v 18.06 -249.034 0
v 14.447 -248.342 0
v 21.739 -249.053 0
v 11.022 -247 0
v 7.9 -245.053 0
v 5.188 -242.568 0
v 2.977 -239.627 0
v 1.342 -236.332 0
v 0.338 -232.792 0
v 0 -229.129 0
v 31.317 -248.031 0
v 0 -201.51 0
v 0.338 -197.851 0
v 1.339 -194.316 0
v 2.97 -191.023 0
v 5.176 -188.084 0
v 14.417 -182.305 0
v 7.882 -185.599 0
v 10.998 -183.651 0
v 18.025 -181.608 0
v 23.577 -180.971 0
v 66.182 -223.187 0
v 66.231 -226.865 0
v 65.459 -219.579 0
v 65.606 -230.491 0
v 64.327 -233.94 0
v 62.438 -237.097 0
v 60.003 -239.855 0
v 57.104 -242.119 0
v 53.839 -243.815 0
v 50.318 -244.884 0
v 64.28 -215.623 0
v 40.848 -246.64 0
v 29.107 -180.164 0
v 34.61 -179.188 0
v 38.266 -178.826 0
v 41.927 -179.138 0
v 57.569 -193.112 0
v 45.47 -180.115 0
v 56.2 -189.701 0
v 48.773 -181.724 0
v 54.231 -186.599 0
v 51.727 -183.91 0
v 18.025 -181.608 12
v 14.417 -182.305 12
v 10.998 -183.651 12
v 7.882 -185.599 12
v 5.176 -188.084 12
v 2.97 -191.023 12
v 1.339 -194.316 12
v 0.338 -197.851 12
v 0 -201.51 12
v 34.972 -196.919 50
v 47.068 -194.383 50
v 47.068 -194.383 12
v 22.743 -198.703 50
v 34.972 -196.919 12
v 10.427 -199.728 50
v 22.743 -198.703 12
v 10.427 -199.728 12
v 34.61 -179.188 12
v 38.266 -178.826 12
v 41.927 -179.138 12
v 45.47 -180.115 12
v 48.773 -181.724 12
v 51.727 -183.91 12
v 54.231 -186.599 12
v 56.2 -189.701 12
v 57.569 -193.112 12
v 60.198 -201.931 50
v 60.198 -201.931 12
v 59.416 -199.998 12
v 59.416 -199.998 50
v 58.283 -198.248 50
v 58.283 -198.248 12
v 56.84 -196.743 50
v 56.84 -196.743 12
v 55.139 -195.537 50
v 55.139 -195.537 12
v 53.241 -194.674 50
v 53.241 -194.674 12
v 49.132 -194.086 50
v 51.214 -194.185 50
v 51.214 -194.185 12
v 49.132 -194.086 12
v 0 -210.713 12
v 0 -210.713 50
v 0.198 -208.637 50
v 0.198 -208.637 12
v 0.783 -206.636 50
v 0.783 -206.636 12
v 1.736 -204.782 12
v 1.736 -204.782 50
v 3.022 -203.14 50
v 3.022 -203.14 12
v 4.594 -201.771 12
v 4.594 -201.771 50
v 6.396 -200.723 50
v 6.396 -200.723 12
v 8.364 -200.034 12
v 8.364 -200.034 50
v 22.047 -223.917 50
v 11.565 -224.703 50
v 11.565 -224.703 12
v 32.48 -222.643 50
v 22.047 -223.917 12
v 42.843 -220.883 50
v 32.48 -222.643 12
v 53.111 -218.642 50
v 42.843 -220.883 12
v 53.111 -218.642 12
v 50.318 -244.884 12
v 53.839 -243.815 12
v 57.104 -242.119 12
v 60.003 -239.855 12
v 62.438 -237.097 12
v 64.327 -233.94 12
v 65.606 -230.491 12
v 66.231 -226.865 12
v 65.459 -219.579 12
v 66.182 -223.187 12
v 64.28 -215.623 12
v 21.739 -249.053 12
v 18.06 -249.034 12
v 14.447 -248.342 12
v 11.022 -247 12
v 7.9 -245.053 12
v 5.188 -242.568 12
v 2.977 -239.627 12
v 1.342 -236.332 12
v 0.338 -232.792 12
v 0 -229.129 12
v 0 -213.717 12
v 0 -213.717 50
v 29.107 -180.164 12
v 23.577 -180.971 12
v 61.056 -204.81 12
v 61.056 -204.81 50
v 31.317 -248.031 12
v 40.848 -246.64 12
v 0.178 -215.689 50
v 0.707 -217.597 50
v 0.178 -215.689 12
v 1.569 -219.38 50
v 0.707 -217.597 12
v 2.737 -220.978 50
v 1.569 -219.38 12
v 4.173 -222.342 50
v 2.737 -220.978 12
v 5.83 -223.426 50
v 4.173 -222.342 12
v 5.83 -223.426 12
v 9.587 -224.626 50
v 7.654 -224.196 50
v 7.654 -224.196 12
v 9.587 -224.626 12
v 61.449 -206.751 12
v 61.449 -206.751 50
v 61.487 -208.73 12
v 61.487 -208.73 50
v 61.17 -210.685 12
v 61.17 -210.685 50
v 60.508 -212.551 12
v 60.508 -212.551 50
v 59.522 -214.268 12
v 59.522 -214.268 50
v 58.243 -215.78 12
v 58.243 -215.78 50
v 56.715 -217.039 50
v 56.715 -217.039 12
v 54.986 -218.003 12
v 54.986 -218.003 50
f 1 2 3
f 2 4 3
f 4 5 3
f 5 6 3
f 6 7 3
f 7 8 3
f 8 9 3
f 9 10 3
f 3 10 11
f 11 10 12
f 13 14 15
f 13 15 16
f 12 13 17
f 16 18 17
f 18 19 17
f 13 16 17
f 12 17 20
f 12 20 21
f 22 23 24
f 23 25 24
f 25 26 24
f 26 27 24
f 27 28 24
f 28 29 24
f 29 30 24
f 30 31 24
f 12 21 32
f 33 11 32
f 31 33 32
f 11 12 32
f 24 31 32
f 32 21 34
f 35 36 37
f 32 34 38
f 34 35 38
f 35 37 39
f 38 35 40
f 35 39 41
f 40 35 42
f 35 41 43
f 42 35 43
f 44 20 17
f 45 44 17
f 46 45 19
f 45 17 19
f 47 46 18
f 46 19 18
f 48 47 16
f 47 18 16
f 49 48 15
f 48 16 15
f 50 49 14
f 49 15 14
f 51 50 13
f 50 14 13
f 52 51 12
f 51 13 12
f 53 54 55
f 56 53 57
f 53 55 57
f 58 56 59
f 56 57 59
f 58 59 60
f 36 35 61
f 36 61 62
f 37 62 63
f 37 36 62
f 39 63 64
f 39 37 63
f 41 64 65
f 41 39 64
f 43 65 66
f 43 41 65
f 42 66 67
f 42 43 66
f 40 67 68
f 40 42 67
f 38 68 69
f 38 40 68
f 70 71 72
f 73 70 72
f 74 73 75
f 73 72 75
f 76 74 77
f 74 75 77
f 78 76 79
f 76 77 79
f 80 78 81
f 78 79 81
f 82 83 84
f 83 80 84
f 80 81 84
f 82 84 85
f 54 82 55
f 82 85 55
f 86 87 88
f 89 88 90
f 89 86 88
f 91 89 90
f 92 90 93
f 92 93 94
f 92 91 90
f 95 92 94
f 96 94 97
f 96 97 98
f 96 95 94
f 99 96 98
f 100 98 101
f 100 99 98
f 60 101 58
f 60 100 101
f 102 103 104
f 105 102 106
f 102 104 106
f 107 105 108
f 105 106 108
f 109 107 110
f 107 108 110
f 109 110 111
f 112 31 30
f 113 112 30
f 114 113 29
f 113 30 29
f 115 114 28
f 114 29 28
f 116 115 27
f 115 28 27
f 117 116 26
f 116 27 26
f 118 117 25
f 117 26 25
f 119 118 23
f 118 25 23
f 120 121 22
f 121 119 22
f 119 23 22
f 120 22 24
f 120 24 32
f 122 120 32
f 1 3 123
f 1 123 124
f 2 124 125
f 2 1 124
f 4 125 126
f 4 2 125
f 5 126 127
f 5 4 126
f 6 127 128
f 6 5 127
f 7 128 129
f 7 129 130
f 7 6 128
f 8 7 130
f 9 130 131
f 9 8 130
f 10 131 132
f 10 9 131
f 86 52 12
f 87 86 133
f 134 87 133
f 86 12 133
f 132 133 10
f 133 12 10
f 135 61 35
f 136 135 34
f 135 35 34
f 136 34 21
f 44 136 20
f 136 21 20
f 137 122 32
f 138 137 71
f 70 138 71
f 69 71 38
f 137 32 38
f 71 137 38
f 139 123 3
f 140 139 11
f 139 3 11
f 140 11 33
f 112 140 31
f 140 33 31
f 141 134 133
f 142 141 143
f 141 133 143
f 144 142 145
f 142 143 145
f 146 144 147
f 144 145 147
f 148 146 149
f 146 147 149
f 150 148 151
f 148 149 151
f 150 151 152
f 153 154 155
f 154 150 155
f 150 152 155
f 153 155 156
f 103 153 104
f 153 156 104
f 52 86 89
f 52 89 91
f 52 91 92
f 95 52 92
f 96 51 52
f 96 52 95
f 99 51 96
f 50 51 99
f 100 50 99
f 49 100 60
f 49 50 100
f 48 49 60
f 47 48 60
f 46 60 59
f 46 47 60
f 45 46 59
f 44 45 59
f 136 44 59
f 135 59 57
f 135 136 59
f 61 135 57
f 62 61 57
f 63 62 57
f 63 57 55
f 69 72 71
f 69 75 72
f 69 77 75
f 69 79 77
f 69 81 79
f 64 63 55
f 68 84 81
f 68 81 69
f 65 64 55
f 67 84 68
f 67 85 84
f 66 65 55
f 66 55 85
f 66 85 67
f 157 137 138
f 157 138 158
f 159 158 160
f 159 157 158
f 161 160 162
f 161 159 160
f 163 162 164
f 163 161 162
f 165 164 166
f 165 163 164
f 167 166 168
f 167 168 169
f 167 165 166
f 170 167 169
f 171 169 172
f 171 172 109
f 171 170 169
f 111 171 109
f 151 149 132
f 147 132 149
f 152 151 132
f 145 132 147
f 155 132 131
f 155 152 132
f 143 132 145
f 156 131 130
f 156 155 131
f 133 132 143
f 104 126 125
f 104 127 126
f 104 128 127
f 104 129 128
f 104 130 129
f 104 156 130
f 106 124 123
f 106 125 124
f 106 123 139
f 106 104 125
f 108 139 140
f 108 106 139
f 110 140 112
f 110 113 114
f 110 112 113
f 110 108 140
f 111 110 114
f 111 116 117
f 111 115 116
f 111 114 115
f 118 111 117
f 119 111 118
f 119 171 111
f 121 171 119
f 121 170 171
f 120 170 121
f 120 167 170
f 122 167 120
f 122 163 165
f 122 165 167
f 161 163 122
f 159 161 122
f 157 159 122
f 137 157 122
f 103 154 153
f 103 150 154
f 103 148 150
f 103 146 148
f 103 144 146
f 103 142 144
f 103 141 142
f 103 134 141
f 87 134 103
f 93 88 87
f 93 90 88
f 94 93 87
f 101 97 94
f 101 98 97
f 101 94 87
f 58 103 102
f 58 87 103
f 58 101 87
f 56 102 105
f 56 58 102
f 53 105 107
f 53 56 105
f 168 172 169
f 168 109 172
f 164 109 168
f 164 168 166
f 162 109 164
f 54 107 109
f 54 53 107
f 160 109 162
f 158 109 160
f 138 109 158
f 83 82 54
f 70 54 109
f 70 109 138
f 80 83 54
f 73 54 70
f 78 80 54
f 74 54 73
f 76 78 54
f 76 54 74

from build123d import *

# Parameters (mm, degrees)
F1_DEPTH    = 12
F2_DEPTH    = 50
F3_T1_DEPTH = 120.7987304743
F3_T3_DEPTH = 107.0496265693
F4_T1_DEPTH = 64.7830881456
F4_T3_DEPTH = 66.9231117077


# Not quite as in the source:
# - a fillet or chamfer that OpenCascade refuses, or shapes differently, is made with other operations: its cross-section is extruded or revolved along the edge and cut away or added


with BuildPart() as f1:
    # F0 (on Top) → F1 (new body)
    with BuildSketch(Plane.XY):
        with BuildLine():
            ThreePointArc((64.2798563582, -215.6225870974), (32.480131643, -222.643304522), (0, -225))
            Line((0, -225), (0, -250))
            ThreePointArc((0, -250), (36.0890351588, -247.3814494688), (71.4220626202, -239.5806523304))
            Line((71.4220626202, -239.5806523304), (64.2798563582, -215.6225870974))
        make_face()
        with BuildLine():
            ThreePointArc((57.1376500962, -191.6645218643), (28.8712281271, -197.9051595751), (0, -200))
            Line((0, -200), (0, -225))
            ThreePointArc((0, -225), (32.480131643, -222.643304522), (64.2798563582, -215.6225870974))
            Line((64.2798563582, -215.6225870974), (57.1376500962, -191.6645218643))
        make_face()
        with BuildLine():
            ThreePointArc((52.1381057128, -174.8938762012), (26.344995666, -180.5884581123), (0, -182.5))
            Line((0, -182.5), (0, -200))
            ThreePointArc((0, -200), (28.8712281271, -197.9051595751), (57.1376500962, -191.6645218643))
            Line((57.1376500962, -191.6645218643), (52.1381057128, -174.8938762012))
        make_face()
    extrude(amount=F1_DEPTH)

    # F0 (on Top) → F2 (join)
    with BuildSketch(Plane.XY):
        with BuildLine():
            ThreePointArc((57.1376500962, -191.6645218643), (28.8712281271, -197.9051595751), (0, -200))
            Line((0, -200), (0, -225))
            ThreePointArc((0, -225), (32.480131643, -222.643304522), (64.2798563582, -215.6225870974))
            Line((64.2798563582, -215.6225870974), (57.1376500962, -191.6645218643))
        make_face()
    extrude(amount=F2_DEPTH)

    # F3: fillet of radius 20 on 4 edges, made by hand

    # F3_s2 → F3_t1 (cut)
    with BuildSketch(Plane.XY.offset(-54.3993652372)):
        with BuildLine():
            ThreePointArc((21.7391304348, -249.0530268998), (6.4867215062, -243.8729803633), (0, -229.1287847478))
            Line((0, -229.1287847478), (0, -250))
            ThreePointArc((0, -250), (10.8798730474, -249.7631445239), (21.7391304348, -249.0530268998))
        make_face()
        with BuildLine():
            ThreePointArc((50.3184233293, -244.883760739), (63.4552732198, -235.5621710033), (65.4594016494, -219.5792948702))
            Line((65.4594016494, -219.5792948702), (71.4220626202, -239.5806523304))
            ThreePointArc((71.4220626202, -239.5806523304), (60.9279674657, -242.4619202689), (50.3184233293, -244.883760739))
        make_face()
    extrude(amount=F3_T1_DEPTH, mode=Mode.SUBTRACT)

    # F3_s4 → F3_t3 (cut)
    with BuildSketch(Plane.XY.offset(-47.5248132847)):
        with BuildLine():
            ThreePointArc((18.024691358, -181.6077104681), (5.1759288176, -188.0843186765), (0, -201.5099253139))
            Line((0, -201.5099253139), (0, -182.5))
            ThreePointArc((0, -182.5), (9.0233818378, -182.2767911178), (18.024691358, -181.6077104681))
        make_face()
        with BuildLine():
            ThreePointArc((34.609719823, -179.1882175082), (48.7732703354, -181.7241570951), (57.5690180175, -193.111517431))
            Line((57.5690180175, -193.111517431), (52.1381057128, -174.8938762012))
            ThreePointArc((52.1381057128, -174.8938762012), (43.42702673, -177.2578442535), (34.609719823, -179.1882175082))
        make_face()
    extrude(amount=F3_T3_DEPTH, mode=Mode.SUBTRACT)

    # F4: fillet of radius 11 on 4 edges, made by hand

    # F4_s2 → F4_t1 (cut)
    with BuildSketch(Plane.XY.offset(12)):
        with BuildLine():
            ThreePointArc((0, -210.7130750571), (3.0216525247, -203.140362758), (10.4265402844, -199.7280332294))
            Line((10.4265402844, -199.7280332294), (10.3691943128, -198.6295290467))
            ThreePointArc((10.3691943128, -198.6295290467), (5.2147333965, -198.83162866), (0.0567649923, -198.8999918998))
            Line((0.0567649923, -198.8999918998), (-1.0397817327, -199.9169455148))
            ThreePointArc((-1.0397817327, -199.9169455148), (-1.1, -201.5099253139), (-1.1, -210.7130750571))
            Line((-1.1, -210.7130750571), (0, -210.7130750571))
        make_face()
        with BuildLine():
            ThreePointArc((60.1982497665, -201.9311039069), (55.1390969064, -195.5372531202), (47.0679630938, -194.3826300115))
            Line((47.0679630938, -194.3826300115), (46.8090892968, -193.3135255465))
            ThreePointArc((46.8090892968, -193.3135255465), (51.8064632167, -192.0346332539), (56.768991531, -190.6265763228))
            Line((56.768991531, -190.6265763228), (58.1103687488, -191.2878754492))
            ThreePointArc((58.1103687488, -191.2878754492), (58.6231728877, -192.7972603555), (61.2524046367, -201.6168468313))
            Line((61.2524046367, -201.6168468313), (60.1982497665, -201.9311039069))
        make_face()
    extrude(amount=F4_T1_DEPTH, mode=Mode.SUBTRACT)

    # F4_s4 → F4_t3 (cut)
    with BuildSketch(Plane.XY.offset(12)):
        with BuildLine():
            ThreePointArc((0, -213.7171027316), (3.4243688767, -221.6926787663), (11.5654205607, -224.7025612833))
            ThreePointArc((11.5654205607, -224.7025612833), (5.7846223415, -224.9256280293), (0, -225))
            Line((0, -225), (0, -213.7171027316))
        make_face()
        with BuildLine():
            ThreePointArc((61.0564651772, -204.8099315465), (60.0533434239, -213.4314083362), (53.1114776019, -218.6416496163))
            ThreePointArc((53.1114776019, -218.6416496163), (58.7150747837, -217.2039133928), (64.2798563582, -215.6225870974))
            Line((64.2798563582, -215.6225870974), (61.0564651772, -204.8099315465))
        make_face()
    extrude(amount=F4_T3_DEPTH, mode=Mode.SUBTRACT)


solid = f1.part
